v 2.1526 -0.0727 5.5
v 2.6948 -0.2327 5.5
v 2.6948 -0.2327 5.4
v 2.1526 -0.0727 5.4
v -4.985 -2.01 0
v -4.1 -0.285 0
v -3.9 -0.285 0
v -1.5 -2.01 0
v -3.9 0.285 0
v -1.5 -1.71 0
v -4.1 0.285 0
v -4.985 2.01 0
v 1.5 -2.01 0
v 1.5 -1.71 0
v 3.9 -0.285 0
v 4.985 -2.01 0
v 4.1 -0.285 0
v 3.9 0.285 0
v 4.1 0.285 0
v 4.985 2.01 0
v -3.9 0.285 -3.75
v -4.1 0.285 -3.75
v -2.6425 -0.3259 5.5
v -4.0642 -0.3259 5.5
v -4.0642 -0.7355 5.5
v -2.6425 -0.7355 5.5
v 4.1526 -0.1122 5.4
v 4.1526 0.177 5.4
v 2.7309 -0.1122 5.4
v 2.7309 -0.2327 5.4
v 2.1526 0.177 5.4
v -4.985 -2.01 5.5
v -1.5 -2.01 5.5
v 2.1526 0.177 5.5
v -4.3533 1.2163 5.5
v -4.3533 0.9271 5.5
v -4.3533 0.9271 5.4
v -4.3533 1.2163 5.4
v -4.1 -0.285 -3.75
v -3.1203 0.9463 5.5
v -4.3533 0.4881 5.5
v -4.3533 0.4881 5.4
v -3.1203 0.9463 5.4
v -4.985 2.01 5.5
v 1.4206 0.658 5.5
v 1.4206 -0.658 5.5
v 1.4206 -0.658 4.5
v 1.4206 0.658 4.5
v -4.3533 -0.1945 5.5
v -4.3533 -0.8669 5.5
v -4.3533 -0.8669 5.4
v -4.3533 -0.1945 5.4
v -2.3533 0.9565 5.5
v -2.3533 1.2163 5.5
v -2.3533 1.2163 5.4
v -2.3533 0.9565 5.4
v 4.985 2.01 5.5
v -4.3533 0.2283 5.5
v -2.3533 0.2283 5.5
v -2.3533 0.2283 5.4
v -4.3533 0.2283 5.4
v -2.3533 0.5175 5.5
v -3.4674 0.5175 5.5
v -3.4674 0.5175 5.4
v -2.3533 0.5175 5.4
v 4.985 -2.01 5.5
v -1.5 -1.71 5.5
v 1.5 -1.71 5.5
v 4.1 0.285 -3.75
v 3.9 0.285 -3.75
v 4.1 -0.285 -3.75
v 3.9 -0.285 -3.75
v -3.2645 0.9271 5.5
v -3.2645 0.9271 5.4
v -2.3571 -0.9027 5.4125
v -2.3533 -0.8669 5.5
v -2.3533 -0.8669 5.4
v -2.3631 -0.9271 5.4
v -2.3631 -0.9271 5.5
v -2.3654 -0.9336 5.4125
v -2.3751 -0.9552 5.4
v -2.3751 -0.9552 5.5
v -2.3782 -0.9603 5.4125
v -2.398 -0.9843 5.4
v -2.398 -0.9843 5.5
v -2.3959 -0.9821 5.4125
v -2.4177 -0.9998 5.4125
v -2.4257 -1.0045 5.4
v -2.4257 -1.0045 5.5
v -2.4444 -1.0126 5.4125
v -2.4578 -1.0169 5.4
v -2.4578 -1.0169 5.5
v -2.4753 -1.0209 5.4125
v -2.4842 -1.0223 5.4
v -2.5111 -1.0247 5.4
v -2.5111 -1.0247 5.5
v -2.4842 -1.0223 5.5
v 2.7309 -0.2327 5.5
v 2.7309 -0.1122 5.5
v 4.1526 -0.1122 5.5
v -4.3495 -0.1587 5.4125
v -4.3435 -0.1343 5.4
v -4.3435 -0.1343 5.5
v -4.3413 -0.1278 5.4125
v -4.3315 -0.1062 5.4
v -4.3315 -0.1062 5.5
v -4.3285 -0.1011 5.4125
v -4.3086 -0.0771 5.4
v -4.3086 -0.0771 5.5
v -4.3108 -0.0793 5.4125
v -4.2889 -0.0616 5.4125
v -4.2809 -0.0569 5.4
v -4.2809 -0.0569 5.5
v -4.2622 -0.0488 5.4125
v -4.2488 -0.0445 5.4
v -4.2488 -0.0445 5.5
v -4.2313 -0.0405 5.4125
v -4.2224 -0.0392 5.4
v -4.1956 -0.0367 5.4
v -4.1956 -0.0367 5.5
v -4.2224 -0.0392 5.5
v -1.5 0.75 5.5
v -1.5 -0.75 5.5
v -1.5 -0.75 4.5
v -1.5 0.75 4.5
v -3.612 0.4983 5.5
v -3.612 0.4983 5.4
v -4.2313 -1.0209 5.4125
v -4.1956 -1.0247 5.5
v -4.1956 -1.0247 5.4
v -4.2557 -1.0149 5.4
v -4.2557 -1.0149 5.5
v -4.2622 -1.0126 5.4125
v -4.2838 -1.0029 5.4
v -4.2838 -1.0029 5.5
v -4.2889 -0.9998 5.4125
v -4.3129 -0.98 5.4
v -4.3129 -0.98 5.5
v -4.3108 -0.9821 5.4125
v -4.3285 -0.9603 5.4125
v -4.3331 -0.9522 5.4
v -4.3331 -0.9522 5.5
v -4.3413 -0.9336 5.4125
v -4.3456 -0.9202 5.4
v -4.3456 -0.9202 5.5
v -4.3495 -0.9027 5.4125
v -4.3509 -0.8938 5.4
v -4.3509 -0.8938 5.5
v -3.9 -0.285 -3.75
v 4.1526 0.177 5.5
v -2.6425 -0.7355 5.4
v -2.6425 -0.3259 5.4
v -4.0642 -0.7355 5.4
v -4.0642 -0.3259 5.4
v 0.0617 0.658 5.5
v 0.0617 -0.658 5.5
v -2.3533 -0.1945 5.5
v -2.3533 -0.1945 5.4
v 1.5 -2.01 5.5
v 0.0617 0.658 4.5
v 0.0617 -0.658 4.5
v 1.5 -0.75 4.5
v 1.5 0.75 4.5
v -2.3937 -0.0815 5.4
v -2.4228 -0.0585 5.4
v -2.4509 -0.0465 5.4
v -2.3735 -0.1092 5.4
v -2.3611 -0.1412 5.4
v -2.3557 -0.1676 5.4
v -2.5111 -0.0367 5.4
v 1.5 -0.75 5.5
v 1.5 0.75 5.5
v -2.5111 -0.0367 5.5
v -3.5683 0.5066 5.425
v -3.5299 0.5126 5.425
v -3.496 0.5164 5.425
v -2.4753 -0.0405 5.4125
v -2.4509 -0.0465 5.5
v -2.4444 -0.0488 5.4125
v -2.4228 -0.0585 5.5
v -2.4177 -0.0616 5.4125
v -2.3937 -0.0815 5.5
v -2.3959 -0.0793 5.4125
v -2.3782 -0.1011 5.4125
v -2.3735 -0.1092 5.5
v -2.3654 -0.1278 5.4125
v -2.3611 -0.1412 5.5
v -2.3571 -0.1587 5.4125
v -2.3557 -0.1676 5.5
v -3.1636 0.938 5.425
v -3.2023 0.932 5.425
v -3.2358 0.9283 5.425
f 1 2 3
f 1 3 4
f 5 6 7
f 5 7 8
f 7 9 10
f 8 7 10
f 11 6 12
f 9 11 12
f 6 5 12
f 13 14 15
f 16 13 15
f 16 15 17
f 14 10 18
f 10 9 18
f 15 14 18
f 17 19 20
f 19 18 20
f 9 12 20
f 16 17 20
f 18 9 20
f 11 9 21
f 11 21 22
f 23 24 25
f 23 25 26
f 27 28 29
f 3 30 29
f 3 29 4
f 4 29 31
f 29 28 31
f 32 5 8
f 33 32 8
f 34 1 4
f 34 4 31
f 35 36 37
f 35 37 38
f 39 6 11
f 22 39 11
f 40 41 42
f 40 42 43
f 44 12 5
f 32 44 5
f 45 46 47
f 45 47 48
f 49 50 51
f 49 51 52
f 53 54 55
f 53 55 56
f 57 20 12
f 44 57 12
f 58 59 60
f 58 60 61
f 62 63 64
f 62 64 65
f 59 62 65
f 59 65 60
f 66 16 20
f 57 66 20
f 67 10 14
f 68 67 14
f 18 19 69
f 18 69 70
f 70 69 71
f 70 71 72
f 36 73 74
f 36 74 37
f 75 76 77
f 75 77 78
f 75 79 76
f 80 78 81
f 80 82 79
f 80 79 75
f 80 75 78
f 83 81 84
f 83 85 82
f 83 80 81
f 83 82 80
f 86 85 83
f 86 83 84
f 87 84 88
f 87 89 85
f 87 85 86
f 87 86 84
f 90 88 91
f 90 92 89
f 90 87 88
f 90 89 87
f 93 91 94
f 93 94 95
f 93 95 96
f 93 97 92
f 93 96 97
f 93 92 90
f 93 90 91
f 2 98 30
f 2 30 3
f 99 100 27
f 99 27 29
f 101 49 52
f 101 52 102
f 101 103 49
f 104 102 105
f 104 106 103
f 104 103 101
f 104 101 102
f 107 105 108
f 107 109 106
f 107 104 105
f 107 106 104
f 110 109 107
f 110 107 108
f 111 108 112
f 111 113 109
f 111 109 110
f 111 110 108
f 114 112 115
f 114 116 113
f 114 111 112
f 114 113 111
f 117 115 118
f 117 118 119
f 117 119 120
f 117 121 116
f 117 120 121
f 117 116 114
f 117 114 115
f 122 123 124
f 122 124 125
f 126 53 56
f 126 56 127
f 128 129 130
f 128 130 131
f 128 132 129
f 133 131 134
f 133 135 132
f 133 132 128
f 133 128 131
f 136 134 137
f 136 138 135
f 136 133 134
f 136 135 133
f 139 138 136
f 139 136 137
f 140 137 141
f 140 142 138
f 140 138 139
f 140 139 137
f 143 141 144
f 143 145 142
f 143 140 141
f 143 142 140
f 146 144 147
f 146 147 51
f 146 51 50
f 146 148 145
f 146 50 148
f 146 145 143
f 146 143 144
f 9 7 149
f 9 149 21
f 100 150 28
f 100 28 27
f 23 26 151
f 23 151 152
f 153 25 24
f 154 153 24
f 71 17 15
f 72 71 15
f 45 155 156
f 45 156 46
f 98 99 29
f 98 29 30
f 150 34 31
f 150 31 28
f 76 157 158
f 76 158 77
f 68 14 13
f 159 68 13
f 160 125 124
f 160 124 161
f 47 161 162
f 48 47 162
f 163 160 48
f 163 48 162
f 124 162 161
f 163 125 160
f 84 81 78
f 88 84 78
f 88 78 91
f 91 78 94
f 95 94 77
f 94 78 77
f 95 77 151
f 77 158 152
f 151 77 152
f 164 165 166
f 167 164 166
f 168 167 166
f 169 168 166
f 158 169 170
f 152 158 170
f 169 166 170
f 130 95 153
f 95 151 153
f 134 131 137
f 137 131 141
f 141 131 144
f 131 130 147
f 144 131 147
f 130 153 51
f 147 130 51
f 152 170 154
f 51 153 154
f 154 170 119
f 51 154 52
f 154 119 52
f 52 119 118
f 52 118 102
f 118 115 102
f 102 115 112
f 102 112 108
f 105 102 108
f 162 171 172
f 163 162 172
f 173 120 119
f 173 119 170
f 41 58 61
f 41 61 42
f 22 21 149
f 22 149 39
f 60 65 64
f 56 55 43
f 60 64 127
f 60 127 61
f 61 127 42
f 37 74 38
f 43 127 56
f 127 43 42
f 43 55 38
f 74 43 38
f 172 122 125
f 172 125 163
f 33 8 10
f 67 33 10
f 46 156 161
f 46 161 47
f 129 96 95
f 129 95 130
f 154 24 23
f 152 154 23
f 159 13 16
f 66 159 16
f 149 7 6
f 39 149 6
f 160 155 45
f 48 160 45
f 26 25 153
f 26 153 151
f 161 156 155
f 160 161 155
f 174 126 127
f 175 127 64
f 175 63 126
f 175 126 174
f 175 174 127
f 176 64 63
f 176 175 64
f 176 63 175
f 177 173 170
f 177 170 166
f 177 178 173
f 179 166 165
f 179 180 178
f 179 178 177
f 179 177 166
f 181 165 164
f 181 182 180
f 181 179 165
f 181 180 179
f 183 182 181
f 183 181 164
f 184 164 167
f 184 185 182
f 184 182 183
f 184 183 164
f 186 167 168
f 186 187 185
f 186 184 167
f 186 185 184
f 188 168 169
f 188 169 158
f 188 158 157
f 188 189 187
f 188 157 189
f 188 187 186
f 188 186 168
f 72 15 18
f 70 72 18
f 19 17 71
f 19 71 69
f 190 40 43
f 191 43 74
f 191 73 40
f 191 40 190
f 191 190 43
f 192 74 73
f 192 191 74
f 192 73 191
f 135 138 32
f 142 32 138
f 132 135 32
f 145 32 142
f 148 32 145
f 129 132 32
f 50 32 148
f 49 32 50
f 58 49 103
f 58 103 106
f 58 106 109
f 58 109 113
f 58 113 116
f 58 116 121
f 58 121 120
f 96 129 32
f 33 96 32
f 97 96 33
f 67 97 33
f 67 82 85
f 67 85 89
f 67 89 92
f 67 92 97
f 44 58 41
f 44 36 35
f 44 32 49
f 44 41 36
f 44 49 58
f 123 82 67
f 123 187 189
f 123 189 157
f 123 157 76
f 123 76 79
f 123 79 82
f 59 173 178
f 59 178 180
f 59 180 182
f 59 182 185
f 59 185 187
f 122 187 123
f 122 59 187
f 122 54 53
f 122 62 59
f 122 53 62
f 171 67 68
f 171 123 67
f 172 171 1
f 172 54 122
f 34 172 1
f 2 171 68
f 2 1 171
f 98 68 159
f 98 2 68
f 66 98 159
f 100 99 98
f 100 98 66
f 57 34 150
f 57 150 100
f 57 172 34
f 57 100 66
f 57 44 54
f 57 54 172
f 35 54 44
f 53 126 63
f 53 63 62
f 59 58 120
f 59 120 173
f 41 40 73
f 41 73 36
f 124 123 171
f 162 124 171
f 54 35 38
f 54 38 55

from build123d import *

# Parameters (mm, degrees)
BOSS_EXTRUDE1_DEPTH = 5.5
SKETCH2_W           = 3
SKETCH2_H           = 1.5
SKETCH2_W_2         = 1.358942276
SKETCH2_H_2         = 1.316057296
CUT_EXTRUDE1_DEPTH  = 1
SKETCH3_W           = 0.2
SKETCH3_H           = 0.57
BOSS_EXTRUDE2_DEPTH = 3.75
SKETCH4_W           = 1.421686747
SKETCH4_H           = 0.409638554
CUT_EXTRUDE2_DEPTH  = 0.1


with BuildPart() as part:
    # Sketch1 → Boss-Extrude1 (new body)
    with BuildSketch(Plane.XY):
        Polygon((-4.985, -2.01), (-1.5, -2.01), (-1.5, -1.71), (1.5, -1.71), (1.5, -2.01), (4.985, -2.01), (4.985, 2.01), (-4.985, 2.01), align=None)
    extrude(amount=BOSS_EXTRUDE1_DEPTH)

    # Sketch2 → Cut-Extrude1 (cut)
    with BuildSketch(Plane.XY.offset(5.5)):
        Rectangle(SKETCH2_W, SKETCH2_H)
        with Locations((0.741156602, 0)):
            Rectangle(SKETCH2_W_2, SKETCH2_H_2, mode=Mode.SUBTRACT)
    extrude(amount=-CUT_EXTRUDE1_DEPTH, mode=Mode.SUBTRACT)

    # Sketch3 → Boss-Extrude2 (add)
    with BuildSketch(Plane(origin=(0, 0, 0), x_dir=(-1, 0, 0), z_dir=(0, 0, -1))):
        with Locations((-4, 0)):
            Rectangle(SKETCH3_W, SKETCH3_H)
        with Locations((4, 0)):
            Rectangle(SKETCH3_W, SKETCH3_H)
    extrude(amount=BOSS_EXTRUDE2_DEPTH)

    # Sketch4 → Cut-Extrude2 (cut)
    # profile 1 of 3: a face of its own
    with BuildSketch(Plane.XY.offset(5.5)):
        with BuildLine():
            Line((-2.353314341, 1.216281942), (-2.353314341, 0.956492785))
            Line((-2.353314341, 0.956492785), (-3.611973979, 0.498284954))
            add(Edge.make_bspline(
                [(-3.611973979, 0.498284954), (-3.597433311, 0.501148384), (-3.570177198, 0.50651581), (-3.531507992, 0.512558558), (-3.497858896, 0.516745674), (-3.476943559, 0.517254487), (-3.467395666, 0.517486761)],
                knots=[0, 0, 0, 0, 1.217419203, 2.282021413, 3.215739318, 4, 4, 4, 4], degree=3))
            Line((-3.467395666, 0.517486761), (-2.353314341, 0.517486761))
            Line((-2.353314341, 0.517486761), (-2.353314341, 0.228330135))
            Line((-2.353314341, 0.228330135), (-4.353314341, 0.228330135))
            Line((-4.353314341, 0.228330135), (-4.353314341, 0.488119291))
            Line((-4.353314341, 0.488119291), (-3.120257112, 0.946327123))
            add(Edge.make_bspline(
                [(-3.120257112, 0.946327123), (-3.134669922, 0.943449375), (-3.161913736, 0.938009714), (-3.200482023, 0.932125999), (-3.234118261, 0.927844891), (-3.254910338, 0.927351775), (-3.264458919, 0.927125315)],
                knots=[0, 0, 0, 0, 1.210373155, 2.287907843, 3.213736571, 4, 4, 4, 4], degree=3))
            Line((-3.264458919, 0.927125315), (-4.353314341, 0.927125315))
            Line((-4.353314341, 0.927125315), (-4.353314341, 1.216281942))
            Line((-4.353314341, 1.216281942), (-2.353314341, 1.216281942))
        make_face()
    # profile 2 of 3: a face of its own
    with BuildSketch(Plane.XY.offset(5.5)):
        with BuildLine():
            add(Edge.make_bspline(
                [(-2.511070365, -0.036730106), (-2.49908555, -0.037580702), (-2.476448953, -0.039187284), (-2.444890766, -0.047711625), (-2.417445544, -0.060219475), (-2.395243748, -0.078659514), (-2.376803709, -0.10086131), (-2.364295859, -0.128306532), (-2.355771519, -0.159864718), (-2.354164936, -0.182501315), (-2.353314341, -0.19448613)],
                knots=[0, 0, 0, 0, 1.144701434, 2.162081395, 3.105417678, 4, 4.894582322, 5.837918605, 6.855298566, 8, 8, 8, 8], degree=3))
            Line((-2.353314341, -0.19448613), (-2.353314341, -0.866925889))
            add(Edge.make_bspline(
                [(-2.353314341, -0.866925889), (-2.354164936, -0.878910704), (-2.355771519, -0.901547302), (-2.364295859, -0.933105488), (-2.376803709, -0.96055071), (-2.395243748, -0.982752506), (-2.417445544, -1.001192545), (-2.444890766, -1.013700395), (-2.476448953, -1.022224736), (-2.49908555, -1.023831318), (-2.511070365, -1.024681914)],
                knots=[0, 0, 0, 0, 1.144701434, 2.162081395, 3.105417678, 4, 4.894582322, 5.837918605, 6.855298566, 8, 8, 8, 8], degree=3))
            Line((-2.511070365, -1.024681914), (-4.195558317, -1.024681914))
            add(Edge.make_bspline(
                [(-4.195558317, -1.024681914), (-4.207543132, -1.023831318), (-4.230179729, -1.022224736), (-4.261737915, -1.013700395), (-4.289183137, -1.001192545), (-4.311384933, -0.982752506), (-4.329824972, -0.96055071), (-4.342332823, -0.933105488), (-4.350857163, -0.901547302), (-4.352463745, -0.878910704), (-4.353314341, -0.866925889)],
                knots=[0, 0, 0, 0, 1.144701434, 2.162081395, 3.105417678, 4, 4.894582322, 5.837918605, 6.855298566, 8, 8, 8, 8], degree=3))
            Line((-4.353314341, -0.866925889), (-4.353314341, -0.19448613))
            add(Edge.make_bspline(
                [(-4.353314341, -0.19448613), (-4.352463745, -0.182501315), (-4.350857163, -0.159864718), (-4.342332823, -0.128306532), (-4.329824972, -0.10086131), (-4.311384933, -0.078659514), (-4.289183137, -0.060219475), (-4.261737915, -0.047711625), (-4.230179729, -0.039187284), (-4.207543132, -0.037580702), (-4.195558317, -0.036730106)],
                knots=[0, 0, 0, 0, 1.144701434, 2.162081395, 3.105417678, 4, 4.894582322, 5.837918605, 6.855298566, 8, 8, 8, 8], degree=3))
            Line((-4.195558317, -0.036730106), (-2.511070365, -0.036730106))
        make_face()
        with Locations((-3.35331434, -0.53070601)):
            Rectangle(SKETCH4_W, SKETCH4_H, mode=Mode.SUBTRACT)
    # profile 3 of 3: a face of its own
    with BuildSketch(Plane.XY.offset(5.5)):
        Polygon((4.152608675, 0.176962569), (4.152608675, -0.112194057), (2.730921928, -0.112194057), (2.730921928, -0.232675985), (2.694777349, -0.232675985), (2.152608675, -0.072660924), (2.152608675, 0.176962569), align=None)
    extrude(amount=-CUT_EXTRUDE2_DEPTH, mode=Mode.SUBTRACT)


solid = part.part
